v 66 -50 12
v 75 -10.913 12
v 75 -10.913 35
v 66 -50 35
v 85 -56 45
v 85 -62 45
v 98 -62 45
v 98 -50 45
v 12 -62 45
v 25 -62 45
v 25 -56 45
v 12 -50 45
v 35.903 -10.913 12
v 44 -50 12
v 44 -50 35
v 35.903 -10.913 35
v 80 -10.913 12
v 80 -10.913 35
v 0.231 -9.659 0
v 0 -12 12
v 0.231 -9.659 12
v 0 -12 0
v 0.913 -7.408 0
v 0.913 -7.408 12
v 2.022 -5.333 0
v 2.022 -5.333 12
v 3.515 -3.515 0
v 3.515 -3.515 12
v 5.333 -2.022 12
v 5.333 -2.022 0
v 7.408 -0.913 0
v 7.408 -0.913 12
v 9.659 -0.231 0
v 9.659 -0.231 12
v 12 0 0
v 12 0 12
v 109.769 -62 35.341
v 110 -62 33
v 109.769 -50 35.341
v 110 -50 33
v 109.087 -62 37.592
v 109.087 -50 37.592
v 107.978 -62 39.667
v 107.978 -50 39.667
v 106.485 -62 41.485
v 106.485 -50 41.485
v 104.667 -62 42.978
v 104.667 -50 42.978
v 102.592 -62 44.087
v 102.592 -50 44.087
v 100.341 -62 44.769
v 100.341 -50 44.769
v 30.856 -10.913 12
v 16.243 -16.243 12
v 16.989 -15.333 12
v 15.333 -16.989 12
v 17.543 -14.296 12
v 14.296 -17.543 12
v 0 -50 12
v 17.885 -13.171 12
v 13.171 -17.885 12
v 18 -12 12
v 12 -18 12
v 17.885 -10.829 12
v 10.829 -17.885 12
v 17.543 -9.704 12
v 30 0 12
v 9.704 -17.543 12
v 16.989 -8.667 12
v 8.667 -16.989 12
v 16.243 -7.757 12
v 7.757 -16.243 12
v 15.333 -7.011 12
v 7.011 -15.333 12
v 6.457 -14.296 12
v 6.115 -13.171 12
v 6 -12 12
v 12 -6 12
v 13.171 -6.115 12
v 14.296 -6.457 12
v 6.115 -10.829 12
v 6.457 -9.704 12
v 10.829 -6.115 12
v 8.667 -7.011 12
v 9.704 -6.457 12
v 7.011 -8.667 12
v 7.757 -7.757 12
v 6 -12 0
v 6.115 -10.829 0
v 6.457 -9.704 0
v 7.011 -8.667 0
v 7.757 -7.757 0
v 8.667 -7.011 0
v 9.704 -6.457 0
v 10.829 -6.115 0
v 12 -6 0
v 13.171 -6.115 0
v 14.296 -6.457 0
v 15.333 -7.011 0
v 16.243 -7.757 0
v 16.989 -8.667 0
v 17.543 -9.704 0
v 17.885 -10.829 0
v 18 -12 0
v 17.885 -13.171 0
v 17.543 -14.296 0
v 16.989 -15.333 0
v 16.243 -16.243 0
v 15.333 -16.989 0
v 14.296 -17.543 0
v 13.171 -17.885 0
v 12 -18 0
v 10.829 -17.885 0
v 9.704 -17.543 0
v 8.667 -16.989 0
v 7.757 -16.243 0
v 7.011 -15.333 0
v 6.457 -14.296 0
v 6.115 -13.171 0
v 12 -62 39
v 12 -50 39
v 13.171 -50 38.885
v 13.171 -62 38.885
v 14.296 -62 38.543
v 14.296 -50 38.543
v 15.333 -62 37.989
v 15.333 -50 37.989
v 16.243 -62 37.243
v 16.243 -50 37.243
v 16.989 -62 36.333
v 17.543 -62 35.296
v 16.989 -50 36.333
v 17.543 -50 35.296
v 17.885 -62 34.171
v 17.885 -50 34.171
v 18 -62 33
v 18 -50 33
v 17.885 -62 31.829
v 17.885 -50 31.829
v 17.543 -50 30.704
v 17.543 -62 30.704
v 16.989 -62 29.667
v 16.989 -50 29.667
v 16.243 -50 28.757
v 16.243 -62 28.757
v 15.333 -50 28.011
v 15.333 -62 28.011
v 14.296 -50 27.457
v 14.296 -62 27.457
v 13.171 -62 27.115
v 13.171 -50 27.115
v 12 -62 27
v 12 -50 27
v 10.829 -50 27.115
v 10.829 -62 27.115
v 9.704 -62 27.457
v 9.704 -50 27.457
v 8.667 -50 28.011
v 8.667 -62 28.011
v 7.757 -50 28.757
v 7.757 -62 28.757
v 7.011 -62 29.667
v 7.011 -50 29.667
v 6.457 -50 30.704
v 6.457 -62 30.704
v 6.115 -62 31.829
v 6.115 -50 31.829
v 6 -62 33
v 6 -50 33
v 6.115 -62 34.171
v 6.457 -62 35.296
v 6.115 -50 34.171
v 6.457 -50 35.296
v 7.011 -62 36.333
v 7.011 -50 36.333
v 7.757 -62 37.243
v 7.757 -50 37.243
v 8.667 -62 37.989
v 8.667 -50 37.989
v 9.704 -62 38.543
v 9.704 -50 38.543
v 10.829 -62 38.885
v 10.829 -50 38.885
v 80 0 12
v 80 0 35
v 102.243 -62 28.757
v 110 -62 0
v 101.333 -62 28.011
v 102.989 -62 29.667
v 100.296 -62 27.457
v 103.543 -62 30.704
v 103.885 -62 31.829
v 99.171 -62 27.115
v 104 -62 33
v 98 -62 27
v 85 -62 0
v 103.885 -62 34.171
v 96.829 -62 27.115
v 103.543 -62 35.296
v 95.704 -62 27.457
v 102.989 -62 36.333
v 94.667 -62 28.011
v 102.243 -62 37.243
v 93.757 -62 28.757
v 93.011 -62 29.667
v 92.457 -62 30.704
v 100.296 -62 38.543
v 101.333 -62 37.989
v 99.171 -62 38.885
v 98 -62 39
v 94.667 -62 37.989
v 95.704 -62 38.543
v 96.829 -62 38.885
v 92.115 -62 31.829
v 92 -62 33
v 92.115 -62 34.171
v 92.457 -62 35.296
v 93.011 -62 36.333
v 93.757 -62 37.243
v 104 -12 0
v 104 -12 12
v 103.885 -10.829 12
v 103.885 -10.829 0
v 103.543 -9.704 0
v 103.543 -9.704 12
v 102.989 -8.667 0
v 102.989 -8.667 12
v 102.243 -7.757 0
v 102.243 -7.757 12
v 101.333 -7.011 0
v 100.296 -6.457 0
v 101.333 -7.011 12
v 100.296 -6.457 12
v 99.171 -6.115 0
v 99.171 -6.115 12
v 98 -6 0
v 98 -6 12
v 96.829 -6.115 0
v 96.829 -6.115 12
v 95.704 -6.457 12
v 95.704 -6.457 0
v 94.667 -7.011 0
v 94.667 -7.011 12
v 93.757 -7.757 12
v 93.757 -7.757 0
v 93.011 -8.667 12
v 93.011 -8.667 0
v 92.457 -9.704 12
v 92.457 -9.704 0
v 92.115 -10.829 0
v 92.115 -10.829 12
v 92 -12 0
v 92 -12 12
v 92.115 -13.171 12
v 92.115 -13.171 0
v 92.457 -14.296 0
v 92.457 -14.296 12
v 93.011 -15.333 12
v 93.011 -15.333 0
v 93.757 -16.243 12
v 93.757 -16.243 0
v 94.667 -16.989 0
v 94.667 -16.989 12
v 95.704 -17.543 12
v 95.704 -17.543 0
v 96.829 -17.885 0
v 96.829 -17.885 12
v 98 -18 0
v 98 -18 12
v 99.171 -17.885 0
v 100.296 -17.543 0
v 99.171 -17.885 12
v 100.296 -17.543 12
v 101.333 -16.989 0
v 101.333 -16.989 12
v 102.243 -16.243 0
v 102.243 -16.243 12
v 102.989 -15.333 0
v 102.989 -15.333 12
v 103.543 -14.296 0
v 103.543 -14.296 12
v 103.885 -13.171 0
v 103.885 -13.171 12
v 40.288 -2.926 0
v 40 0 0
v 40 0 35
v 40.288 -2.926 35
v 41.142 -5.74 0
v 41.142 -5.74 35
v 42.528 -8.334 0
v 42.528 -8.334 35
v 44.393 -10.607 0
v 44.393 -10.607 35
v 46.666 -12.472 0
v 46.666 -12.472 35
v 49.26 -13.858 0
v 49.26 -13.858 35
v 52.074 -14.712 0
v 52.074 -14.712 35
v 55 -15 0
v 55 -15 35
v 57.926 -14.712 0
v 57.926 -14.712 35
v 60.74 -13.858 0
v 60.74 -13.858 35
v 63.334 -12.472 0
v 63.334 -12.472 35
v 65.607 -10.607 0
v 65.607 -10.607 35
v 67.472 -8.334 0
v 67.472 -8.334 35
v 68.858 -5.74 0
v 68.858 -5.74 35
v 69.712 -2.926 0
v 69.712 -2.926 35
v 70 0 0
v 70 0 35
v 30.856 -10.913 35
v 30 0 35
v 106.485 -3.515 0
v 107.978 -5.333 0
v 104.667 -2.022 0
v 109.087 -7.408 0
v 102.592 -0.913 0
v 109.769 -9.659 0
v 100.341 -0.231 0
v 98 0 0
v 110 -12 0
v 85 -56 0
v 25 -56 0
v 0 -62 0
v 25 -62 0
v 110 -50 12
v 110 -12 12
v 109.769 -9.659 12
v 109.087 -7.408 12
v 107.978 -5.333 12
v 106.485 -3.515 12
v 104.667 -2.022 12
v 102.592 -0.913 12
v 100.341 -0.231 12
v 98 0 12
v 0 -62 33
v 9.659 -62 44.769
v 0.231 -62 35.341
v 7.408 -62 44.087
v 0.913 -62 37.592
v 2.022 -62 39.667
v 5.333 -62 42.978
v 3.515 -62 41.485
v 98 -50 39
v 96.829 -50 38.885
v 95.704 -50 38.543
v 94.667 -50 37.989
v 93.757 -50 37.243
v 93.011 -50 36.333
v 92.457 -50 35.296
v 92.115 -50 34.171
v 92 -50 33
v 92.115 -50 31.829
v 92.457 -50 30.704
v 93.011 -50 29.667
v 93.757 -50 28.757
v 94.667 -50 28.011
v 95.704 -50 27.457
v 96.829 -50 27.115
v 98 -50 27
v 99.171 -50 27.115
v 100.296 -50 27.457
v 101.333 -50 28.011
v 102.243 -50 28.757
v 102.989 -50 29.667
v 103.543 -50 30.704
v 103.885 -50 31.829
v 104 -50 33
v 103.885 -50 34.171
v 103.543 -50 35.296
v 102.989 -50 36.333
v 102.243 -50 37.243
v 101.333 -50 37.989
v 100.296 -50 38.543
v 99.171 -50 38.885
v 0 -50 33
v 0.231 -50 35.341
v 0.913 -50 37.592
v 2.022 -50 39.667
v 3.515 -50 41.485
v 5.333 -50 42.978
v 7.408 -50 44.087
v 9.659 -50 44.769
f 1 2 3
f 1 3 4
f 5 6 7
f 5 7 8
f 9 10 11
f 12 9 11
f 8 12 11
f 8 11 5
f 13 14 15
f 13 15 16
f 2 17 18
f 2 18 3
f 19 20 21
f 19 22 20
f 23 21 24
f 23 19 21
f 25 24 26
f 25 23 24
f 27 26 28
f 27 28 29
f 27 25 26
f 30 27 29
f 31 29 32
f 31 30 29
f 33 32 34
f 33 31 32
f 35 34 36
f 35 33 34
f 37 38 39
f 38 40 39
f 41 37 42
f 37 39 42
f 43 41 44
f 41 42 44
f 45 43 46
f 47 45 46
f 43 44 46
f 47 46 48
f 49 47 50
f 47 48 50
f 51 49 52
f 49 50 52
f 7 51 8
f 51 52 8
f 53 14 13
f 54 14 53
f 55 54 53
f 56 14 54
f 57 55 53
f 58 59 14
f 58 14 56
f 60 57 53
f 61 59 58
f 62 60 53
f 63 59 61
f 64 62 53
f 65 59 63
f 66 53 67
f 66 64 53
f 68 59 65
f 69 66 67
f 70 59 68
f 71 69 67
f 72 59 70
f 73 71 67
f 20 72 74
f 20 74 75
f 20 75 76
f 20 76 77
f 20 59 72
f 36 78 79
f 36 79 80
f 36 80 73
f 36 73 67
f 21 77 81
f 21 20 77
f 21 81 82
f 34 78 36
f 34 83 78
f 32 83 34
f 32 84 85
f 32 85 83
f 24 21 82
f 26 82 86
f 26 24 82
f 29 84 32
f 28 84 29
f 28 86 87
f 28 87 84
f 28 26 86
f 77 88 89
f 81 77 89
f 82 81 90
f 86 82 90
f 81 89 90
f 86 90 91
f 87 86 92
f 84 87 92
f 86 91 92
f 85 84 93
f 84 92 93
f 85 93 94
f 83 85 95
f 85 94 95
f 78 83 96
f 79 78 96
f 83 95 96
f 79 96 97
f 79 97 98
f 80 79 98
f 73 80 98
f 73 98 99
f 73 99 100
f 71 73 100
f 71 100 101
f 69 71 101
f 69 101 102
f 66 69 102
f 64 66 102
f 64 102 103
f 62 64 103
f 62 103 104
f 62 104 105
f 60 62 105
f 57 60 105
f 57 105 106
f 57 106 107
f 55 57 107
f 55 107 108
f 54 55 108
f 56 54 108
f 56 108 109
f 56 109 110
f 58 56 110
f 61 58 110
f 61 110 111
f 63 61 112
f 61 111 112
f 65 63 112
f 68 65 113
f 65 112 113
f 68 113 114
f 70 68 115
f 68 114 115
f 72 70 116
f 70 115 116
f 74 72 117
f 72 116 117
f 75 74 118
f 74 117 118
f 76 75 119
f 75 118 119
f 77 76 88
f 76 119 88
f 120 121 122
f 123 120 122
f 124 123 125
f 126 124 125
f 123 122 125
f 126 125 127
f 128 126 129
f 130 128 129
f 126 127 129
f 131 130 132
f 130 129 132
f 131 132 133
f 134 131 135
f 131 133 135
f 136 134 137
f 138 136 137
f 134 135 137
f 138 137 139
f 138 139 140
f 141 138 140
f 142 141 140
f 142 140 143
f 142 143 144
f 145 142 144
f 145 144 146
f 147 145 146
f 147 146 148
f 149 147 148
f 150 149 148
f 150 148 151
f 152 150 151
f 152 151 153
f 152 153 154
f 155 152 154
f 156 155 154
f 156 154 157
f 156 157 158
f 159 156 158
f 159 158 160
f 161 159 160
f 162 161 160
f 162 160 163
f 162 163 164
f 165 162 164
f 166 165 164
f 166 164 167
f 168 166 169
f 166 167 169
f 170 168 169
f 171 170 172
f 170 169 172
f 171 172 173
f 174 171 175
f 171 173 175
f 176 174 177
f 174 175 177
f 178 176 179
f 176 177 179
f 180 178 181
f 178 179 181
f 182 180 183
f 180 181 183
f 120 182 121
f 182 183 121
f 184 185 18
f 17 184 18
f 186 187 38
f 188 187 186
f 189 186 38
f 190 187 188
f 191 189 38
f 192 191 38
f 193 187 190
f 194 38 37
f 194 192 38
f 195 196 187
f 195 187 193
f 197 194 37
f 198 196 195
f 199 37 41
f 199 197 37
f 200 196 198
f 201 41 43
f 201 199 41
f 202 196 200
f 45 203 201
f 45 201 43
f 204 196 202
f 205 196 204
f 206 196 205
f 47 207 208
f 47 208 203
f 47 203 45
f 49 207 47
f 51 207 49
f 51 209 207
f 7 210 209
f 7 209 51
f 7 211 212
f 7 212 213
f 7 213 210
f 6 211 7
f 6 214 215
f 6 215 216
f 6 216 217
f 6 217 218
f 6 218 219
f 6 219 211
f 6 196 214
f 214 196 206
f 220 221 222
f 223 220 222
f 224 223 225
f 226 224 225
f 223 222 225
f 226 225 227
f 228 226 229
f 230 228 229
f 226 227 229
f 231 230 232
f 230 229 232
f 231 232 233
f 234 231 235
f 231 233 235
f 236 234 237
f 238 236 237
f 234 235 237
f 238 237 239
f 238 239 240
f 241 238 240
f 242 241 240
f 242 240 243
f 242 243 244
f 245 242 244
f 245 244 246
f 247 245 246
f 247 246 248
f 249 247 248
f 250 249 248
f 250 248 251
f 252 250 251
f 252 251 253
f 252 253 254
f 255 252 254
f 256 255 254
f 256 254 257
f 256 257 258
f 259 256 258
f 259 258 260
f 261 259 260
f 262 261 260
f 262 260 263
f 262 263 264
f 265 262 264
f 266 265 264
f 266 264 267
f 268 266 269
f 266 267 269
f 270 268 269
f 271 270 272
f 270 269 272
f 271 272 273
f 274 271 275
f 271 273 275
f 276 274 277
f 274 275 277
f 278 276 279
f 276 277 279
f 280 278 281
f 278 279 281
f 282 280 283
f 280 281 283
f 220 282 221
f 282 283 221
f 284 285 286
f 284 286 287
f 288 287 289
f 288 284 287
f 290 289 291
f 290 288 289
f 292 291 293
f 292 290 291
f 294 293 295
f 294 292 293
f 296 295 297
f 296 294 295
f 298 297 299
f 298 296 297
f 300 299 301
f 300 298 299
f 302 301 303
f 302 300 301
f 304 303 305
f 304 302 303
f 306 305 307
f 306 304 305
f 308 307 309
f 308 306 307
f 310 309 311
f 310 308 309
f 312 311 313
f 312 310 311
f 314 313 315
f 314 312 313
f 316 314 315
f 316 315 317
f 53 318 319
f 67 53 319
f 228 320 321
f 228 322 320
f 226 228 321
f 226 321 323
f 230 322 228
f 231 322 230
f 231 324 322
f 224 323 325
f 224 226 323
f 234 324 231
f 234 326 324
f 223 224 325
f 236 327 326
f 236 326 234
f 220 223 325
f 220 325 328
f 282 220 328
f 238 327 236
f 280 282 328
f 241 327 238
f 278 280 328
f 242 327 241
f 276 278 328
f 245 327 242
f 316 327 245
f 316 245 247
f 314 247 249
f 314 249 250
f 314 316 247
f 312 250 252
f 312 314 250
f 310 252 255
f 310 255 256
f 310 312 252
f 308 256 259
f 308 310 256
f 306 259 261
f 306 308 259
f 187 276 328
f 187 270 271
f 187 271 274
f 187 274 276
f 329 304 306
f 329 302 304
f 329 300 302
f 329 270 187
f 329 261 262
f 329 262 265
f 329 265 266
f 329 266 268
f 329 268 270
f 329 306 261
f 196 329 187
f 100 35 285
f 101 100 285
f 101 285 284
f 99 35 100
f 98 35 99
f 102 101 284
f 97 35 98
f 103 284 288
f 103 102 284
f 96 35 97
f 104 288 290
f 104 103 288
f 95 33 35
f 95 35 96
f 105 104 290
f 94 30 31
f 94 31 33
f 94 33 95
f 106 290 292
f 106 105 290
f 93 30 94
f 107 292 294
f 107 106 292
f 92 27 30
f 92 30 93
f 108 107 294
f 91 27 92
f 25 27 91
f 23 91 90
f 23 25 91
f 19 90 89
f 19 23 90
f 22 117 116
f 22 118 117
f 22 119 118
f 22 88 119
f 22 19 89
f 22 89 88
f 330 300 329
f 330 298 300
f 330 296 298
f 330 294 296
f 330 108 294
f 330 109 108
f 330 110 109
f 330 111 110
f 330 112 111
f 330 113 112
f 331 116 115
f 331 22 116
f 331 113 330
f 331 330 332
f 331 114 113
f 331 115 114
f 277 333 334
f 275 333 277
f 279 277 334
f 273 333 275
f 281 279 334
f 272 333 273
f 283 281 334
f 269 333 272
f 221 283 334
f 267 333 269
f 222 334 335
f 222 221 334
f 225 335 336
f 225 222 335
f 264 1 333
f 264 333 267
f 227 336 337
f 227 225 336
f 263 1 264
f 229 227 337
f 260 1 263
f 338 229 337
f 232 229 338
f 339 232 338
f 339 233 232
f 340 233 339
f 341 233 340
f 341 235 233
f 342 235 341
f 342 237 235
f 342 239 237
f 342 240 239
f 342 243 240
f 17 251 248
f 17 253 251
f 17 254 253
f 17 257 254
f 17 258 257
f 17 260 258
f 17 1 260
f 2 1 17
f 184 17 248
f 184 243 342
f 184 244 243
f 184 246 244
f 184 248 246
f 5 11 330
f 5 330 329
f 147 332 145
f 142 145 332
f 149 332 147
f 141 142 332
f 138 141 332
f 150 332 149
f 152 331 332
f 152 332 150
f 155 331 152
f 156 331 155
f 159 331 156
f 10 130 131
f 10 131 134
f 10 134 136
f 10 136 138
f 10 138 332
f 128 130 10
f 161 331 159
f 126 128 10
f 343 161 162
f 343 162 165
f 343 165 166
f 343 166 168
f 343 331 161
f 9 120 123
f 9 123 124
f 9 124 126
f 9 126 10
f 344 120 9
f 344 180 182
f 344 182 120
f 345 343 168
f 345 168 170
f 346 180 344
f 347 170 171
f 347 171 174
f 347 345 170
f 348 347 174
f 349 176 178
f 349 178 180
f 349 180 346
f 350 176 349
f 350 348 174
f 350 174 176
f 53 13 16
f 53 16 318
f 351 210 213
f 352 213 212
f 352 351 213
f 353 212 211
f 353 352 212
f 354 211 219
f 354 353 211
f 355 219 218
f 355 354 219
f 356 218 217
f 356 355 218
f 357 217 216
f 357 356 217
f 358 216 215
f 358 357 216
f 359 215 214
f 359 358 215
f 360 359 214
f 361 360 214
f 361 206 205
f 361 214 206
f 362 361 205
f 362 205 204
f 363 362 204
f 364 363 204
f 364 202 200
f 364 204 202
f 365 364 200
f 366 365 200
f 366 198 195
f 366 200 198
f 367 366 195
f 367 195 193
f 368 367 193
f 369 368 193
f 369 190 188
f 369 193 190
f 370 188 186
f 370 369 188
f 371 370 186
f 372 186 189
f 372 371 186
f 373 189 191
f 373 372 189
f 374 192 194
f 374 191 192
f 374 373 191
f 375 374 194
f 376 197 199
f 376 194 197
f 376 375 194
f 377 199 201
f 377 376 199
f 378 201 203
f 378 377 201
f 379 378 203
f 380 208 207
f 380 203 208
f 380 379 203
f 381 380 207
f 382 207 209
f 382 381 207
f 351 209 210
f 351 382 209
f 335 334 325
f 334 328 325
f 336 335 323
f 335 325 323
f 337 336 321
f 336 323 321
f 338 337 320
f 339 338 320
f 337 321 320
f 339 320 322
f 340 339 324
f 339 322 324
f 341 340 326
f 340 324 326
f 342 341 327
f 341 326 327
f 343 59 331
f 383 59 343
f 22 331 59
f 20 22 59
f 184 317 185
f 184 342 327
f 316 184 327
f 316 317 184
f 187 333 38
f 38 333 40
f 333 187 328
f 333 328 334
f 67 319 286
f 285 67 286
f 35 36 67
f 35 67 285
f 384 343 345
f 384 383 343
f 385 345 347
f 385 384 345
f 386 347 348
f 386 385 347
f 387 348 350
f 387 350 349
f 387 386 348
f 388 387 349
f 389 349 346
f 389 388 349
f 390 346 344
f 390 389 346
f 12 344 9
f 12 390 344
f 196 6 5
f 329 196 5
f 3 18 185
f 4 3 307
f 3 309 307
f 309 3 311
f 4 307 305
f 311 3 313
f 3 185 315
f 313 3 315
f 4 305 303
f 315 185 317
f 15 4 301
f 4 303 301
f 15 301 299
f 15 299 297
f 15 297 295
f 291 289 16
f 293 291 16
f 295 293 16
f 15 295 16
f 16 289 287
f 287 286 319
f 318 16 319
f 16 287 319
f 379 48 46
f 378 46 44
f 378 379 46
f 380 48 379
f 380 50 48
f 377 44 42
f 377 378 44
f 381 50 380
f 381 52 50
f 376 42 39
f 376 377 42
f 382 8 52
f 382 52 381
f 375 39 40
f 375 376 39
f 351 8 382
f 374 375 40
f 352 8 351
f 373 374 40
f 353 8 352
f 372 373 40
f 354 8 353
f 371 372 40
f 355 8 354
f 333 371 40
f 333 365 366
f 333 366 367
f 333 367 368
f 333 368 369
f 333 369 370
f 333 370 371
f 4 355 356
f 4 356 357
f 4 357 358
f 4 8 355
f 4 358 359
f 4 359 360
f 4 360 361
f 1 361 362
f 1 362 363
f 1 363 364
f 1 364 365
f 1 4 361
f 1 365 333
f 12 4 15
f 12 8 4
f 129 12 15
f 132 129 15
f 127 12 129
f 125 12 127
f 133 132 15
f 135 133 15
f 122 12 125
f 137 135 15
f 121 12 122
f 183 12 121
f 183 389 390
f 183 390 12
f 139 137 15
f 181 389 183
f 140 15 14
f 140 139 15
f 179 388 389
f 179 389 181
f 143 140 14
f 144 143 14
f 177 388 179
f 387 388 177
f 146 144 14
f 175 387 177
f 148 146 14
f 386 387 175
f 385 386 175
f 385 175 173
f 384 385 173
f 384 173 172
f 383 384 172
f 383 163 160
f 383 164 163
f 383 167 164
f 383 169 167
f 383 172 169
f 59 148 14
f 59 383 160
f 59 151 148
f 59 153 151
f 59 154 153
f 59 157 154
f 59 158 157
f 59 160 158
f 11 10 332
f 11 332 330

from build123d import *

# Parameters (mm, degrees)
BOSS_EXTRUDE1_DEPTH = 110
BOSS_EXTRUDE2_DEPTH = 23
CUT_EXTRUDE1_START  = -23
CUT_EXTRUDE1_DEPTH  = 23
SKETCH6_W           = 60
SKETCH6_H           = 6
CUT_EXTRUDE2_DEPTH  = 153
FILLET1_R           = 12
SKETCH9_R           = 6
CUT_EXTRUDE3_DEPTH  = 153
FILLET3_R           = 12
SKETCH10_R          = 6
CUT_EXTRUDE4_DEPTH  = 153
SKETCH11_R          = 6
CUT_EXTRUDE5_DEPTH  = 153


with BuildPart() as part:
    # Sketch1 → Boss-Extrude1 (new body)
    with BuildSketch(Plane(origin=(0, 0, 0), x_dir=(0, 0, -1), z_dir=(1, 0, 0))):
        Polygon((0, 0), (0, -62), (-45, -62), (-45, -50), (-12, -50), (-12, 0), align=None)
    extrude(amount=BOSS_EXTRUDE1_DEPTH)

    # Sketch4 → Boss-Extrude2 (add)
    with BuildSketch(Plane.XY.offset(12)):
        with BuildLine():
            Line((30, 0), (40, 0))
            ThreePointArc((40, 0), (55, -15), (70, 0))
            Line((70, 0), (80, 0))
            Line((80, 0), (80, -10.913379379))
            Line((80, -10.913379379), (75, -10.913379379))
            Line((75, -10.913379379), (66, -50))
            Line((66, -50), (44, -50))
            Line((44, -50), (35.902837649, -10.913379379))
            Line((35.902837649, -10.913379379), (30.855515073, -10.913379379))
            Line((30.855515073, -10.913379379), (30, 0))
        make_face()
    extrude(amount=BOSS_EXTRUDE2_DEPTH)

    # Sketch5 → Cut-Extrude1 (cut)
    with BuildSketch(Plane.XY.offset(12).offset(CUT_EXTRUDE1_START)):
        with BuildLine():
            Line((70, 0), (40, 0))
            ThreePointArc((40, 0), (55, -15), (70, 0))
        make_face()
    extrude(amount=CUT_EXTRUDE1_DEPTH, mode=Mode.SUBTRACT)

    # Sketch6 → Cut-Extrude2 (cut)
    with BuildSketch(Plane.XY.offset(45)):
        with Locations((55, -59)):
            Rectangle(SKETCH6_W, SKETCH6_H)
    extrude(amount=-CUT_EXTRUDE2_DEPTH, mode=Mode.SUBTRACT)

    # Fillet1
    fillet1_edges = [part.edges().sort_by_distance(p)[0] for p in [
        (110, -56, 45),
        (0, -56, 45),
    ]]
    fillet(fillet1_edges, radius=FILLET1_R)

    # Sketch9 → Cut-Extrude3 (cut)
    with BuildSketch(Plane(origin=(0, -50, 0), x_dir=(1, 0, 0), z_dir=(0, 1, 0))):
        with Locations(Location((12, -33, 0), (0, 0, 270))):
            Circle(SKETCH9_R)
    cut_extrude3 = extrude(amount=-CUT_EXTRUDE3_DEPTH, mode=Mode.SUBTRACT)

    # Mirror1: Cut-Extrude3 across plane
    add(cut_extrude3.mirror(Plane.ZY.offset(-55)), mode=Mode.SUBTRACT)

    # Fillet3
    fillet3_edges = [part.edges().sort_by_distance(p)[0] for p in [
        (110, 0, 6),
        (0, 0, 6),
    ]]
    fillet(fillet3_edges, radius=FILLET3_R)

    # Sketch10 → Cut-Extrude4 (cut)
    with BuildSketch(Plane(origin=(0, 0, 0), x_dir=(-1, 0, 0), z_dir=(0, 0, -1))):
        with Locations((-12, -12)):
            Circle(SKETCH10_R)
    extrude(amount=-CUT_EXTRUDE4_DEPTH, mode=Mode.SUBTRACT)

    # Sketch11 → Cut-Extrude5 (cut)
    with BuildSketch(Plane.XY.offset(12)):
        with Locations((98, -12)):
            Circle(SKETCH11_R)
    extrude(amount=-CUT_EXTRUDE5_DEPTH, mode=Mode.SUBTRACT)


solid = part.part
